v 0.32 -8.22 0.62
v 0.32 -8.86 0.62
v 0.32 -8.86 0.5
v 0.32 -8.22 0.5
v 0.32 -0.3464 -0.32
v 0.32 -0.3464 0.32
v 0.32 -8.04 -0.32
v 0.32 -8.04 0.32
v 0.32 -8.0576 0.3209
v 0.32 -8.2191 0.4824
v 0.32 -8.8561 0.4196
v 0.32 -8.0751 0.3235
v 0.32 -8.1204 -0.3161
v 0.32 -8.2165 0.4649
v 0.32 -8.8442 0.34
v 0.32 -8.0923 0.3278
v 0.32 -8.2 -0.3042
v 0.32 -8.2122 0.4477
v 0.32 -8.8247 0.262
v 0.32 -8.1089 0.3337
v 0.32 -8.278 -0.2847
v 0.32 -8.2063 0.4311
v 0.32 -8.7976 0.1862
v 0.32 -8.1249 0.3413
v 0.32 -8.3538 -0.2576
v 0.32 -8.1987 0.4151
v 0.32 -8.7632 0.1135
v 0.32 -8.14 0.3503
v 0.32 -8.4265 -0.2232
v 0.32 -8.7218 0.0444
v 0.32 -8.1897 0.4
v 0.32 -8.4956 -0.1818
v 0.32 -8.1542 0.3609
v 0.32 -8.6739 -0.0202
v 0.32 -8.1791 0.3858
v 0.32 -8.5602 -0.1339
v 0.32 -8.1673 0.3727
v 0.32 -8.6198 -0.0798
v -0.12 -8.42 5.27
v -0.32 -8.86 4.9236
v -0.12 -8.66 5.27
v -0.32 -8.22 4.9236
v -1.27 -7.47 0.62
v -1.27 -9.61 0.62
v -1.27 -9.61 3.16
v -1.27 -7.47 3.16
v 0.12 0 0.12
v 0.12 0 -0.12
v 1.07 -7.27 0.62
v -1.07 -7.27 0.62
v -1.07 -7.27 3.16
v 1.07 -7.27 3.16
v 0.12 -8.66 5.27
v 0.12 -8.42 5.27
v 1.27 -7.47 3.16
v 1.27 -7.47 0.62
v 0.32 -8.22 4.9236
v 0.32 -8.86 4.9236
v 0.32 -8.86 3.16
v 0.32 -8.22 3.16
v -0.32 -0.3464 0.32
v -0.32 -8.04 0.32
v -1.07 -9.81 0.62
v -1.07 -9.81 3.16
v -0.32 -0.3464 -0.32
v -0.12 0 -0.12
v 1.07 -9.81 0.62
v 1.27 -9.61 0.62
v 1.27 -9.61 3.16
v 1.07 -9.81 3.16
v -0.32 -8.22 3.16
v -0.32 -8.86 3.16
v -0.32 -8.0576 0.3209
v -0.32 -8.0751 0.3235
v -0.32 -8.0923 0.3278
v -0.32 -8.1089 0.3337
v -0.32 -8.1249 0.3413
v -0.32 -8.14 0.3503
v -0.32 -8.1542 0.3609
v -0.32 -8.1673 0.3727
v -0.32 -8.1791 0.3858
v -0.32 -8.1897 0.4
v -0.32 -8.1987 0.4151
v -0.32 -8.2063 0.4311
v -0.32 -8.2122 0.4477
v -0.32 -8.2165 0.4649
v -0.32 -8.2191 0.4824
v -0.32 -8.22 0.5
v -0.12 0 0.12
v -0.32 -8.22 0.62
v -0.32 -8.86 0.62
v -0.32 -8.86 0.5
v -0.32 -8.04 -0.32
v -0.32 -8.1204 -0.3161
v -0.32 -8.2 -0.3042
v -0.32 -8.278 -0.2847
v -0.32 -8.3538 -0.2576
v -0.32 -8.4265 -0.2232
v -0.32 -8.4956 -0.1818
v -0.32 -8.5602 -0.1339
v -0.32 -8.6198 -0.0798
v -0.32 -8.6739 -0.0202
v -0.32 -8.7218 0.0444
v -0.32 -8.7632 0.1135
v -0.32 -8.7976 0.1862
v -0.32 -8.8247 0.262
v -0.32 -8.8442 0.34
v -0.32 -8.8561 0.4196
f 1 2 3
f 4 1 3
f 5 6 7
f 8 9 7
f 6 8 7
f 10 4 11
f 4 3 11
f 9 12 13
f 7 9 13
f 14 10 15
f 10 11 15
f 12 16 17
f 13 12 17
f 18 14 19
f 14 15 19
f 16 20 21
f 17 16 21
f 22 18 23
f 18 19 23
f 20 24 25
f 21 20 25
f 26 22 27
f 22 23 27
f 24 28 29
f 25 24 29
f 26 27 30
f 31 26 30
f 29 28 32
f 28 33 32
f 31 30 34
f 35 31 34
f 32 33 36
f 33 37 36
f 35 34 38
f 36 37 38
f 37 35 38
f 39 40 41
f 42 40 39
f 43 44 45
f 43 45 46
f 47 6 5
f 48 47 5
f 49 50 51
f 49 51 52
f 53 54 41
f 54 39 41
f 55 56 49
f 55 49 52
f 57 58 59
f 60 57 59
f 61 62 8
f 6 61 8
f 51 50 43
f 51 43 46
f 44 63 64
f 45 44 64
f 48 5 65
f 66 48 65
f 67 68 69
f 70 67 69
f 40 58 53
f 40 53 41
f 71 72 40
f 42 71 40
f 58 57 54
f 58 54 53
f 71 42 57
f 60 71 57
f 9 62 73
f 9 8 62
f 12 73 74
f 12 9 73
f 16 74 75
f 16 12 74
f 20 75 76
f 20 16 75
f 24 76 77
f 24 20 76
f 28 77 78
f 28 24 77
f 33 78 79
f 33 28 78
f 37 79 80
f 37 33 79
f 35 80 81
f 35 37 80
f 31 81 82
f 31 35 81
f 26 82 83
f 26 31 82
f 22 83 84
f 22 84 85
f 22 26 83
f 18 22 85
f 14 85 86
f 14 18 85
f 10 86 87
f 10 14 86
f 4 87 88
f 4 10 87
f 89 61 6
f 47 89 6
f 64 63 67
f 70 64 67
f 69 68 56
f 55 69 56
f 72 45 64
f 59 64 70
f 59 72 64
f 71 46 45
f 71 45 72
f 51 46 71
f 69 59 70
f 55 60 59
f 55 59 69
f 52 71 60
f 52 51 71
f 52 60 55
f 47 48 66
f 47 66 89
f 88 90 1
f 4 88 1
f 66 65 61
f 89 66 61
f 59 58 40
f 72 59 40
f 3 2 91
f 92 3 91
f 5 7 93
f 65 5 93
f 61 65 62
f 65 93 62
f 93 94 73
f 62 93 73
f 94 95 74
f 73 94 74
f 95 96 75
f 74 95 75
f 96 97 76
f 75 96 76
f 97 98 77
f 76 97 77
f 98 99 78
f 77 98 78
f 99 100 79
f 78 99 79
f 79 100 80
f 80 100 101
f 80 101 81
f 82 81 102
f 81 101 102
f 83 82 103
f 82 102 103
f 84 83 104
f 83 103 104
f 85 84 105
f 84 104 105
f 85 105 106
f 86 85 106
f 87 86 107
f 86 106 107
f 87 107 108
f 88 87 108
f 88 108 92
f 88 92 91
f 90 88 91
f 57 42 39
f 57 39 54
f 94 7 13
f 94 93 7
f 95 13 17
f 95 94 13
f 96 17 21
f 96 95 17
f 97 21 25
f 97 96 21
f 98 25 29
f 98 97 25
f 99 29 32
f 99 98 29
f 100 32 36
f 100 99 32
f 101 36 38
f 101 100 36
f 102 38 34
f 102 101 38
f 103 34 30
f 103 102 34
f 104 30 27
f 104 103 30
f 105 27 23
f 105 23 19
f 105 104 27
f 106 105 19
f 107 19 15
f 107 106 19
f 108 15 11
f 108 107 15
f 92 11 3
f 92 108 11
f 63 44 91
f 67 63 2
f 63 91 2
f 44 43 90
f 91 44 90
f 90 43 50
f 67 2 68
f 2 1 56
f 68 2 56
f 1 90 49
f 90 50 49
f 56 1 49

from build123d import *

# Parameters (mm, degrees)
SKETCH_2_W      = 0.64
SKETCH_2_H      = 0.64
CHAMFER_1_SIZE  = 0.2
CHAMFER_1_SIZE2 = 0.346410162
CHAMFER_2_SIZE  = 0.2
CHAMFER_2_SIZE2 = 0.346410162
SKETCH_3_W      = 2.54
SKETCH_3_H      = 2.54
EXTRUDE_1_DEPTH = 2.54
CHAMFER_3_SIZE  = 0.2


with BuildPart() as part:
    # По траектории1: sweep along a path in Эскиз1
    with BuildLine(Plane(origin=(0, 0, 0), x_dir=(0, 0, -1), z_dir=(1, 0, 0))) as sweep_1_path:
        Line((0, 0), (0, -8.04))
        ThreePointArc((0, -8.04), (-0.146446609, -8.393553391), (-0.5, -8.54))
        Line((-0.5, -8.54), (-5.27, -8.54))
    # Эскиз2 → По траектории1 (sweep)
    with BuildSketch(Plane(origin=(0, 0, 0), x_dir=(1, 0, 0), z_dir=(0, 1, 0))):
        Rectangle(SKETCH_2_W, SKETCH_2_H)
    sweep(path=sweep_1_path.line)

    # Фаска1
    chamfer_1_edges = [part.edges().sort_by_distance(p)[0] for p in [
        (0.32, -8.54, 5.27),
        (0, -8.86, 5.27),
        (-0.32, -8.54, 5.27),
        (0, -8.22, 5.27),
    ]]
    chamfer_1_side = [part.faces().sort_by_distance(p)[0] for p in [
        (0, -8.54, 5.27),
    ]]
    chamfer(chamfer_1_edges, length=CHAMFER_1_SIZE, length2=CHAMFER_1_SIZE2, reference=chamfer_1_side[0])

    # Фаска2
    chamfer_2_edges = [part.edges().sort_by_distance(p)[0] for p in [
        (0, 0, 0.32),
        (-0.32, 0, 0),
        (0, 0, -0.32),
        (0.32, 0, 0),
    ]]
    chamfer_2_side = [part.faces().sort_by_distance(p)[0] for p in [
        (0, 0, 0),
    ]]
    chamfer(chamfer_2_edges, length=CHAMFER_2_SIZE, length2=CHAMFER_2_SIZE2, reference=chamfer_2_side[0])

    # Эскиз3 → Бобышка-Вытянуть1 (add)
    with BuildSketch(Plane.XY.offset(0.62)):
        with Locations((0, -8.54)):
            Rectangle(SKETCH_3_W, SKETCH_3_H)
    extrude(amount=EXTRUDE_1_DEPTH)

    # Фаска3
    chamfer_3_edges = [part.edges().sort_by_distance(p)[0] for p in [
        (1.27, -9.81, 1.89),
        (1.27, -7.27, 1.89),
        (-1.27, -7.27, 1.89),
        (-1.27, -9.81, 1.89),
    ]]
    chamfer(chamfer_3_edges, length=CHAMFER_3_SIZE)


solid = part.part
